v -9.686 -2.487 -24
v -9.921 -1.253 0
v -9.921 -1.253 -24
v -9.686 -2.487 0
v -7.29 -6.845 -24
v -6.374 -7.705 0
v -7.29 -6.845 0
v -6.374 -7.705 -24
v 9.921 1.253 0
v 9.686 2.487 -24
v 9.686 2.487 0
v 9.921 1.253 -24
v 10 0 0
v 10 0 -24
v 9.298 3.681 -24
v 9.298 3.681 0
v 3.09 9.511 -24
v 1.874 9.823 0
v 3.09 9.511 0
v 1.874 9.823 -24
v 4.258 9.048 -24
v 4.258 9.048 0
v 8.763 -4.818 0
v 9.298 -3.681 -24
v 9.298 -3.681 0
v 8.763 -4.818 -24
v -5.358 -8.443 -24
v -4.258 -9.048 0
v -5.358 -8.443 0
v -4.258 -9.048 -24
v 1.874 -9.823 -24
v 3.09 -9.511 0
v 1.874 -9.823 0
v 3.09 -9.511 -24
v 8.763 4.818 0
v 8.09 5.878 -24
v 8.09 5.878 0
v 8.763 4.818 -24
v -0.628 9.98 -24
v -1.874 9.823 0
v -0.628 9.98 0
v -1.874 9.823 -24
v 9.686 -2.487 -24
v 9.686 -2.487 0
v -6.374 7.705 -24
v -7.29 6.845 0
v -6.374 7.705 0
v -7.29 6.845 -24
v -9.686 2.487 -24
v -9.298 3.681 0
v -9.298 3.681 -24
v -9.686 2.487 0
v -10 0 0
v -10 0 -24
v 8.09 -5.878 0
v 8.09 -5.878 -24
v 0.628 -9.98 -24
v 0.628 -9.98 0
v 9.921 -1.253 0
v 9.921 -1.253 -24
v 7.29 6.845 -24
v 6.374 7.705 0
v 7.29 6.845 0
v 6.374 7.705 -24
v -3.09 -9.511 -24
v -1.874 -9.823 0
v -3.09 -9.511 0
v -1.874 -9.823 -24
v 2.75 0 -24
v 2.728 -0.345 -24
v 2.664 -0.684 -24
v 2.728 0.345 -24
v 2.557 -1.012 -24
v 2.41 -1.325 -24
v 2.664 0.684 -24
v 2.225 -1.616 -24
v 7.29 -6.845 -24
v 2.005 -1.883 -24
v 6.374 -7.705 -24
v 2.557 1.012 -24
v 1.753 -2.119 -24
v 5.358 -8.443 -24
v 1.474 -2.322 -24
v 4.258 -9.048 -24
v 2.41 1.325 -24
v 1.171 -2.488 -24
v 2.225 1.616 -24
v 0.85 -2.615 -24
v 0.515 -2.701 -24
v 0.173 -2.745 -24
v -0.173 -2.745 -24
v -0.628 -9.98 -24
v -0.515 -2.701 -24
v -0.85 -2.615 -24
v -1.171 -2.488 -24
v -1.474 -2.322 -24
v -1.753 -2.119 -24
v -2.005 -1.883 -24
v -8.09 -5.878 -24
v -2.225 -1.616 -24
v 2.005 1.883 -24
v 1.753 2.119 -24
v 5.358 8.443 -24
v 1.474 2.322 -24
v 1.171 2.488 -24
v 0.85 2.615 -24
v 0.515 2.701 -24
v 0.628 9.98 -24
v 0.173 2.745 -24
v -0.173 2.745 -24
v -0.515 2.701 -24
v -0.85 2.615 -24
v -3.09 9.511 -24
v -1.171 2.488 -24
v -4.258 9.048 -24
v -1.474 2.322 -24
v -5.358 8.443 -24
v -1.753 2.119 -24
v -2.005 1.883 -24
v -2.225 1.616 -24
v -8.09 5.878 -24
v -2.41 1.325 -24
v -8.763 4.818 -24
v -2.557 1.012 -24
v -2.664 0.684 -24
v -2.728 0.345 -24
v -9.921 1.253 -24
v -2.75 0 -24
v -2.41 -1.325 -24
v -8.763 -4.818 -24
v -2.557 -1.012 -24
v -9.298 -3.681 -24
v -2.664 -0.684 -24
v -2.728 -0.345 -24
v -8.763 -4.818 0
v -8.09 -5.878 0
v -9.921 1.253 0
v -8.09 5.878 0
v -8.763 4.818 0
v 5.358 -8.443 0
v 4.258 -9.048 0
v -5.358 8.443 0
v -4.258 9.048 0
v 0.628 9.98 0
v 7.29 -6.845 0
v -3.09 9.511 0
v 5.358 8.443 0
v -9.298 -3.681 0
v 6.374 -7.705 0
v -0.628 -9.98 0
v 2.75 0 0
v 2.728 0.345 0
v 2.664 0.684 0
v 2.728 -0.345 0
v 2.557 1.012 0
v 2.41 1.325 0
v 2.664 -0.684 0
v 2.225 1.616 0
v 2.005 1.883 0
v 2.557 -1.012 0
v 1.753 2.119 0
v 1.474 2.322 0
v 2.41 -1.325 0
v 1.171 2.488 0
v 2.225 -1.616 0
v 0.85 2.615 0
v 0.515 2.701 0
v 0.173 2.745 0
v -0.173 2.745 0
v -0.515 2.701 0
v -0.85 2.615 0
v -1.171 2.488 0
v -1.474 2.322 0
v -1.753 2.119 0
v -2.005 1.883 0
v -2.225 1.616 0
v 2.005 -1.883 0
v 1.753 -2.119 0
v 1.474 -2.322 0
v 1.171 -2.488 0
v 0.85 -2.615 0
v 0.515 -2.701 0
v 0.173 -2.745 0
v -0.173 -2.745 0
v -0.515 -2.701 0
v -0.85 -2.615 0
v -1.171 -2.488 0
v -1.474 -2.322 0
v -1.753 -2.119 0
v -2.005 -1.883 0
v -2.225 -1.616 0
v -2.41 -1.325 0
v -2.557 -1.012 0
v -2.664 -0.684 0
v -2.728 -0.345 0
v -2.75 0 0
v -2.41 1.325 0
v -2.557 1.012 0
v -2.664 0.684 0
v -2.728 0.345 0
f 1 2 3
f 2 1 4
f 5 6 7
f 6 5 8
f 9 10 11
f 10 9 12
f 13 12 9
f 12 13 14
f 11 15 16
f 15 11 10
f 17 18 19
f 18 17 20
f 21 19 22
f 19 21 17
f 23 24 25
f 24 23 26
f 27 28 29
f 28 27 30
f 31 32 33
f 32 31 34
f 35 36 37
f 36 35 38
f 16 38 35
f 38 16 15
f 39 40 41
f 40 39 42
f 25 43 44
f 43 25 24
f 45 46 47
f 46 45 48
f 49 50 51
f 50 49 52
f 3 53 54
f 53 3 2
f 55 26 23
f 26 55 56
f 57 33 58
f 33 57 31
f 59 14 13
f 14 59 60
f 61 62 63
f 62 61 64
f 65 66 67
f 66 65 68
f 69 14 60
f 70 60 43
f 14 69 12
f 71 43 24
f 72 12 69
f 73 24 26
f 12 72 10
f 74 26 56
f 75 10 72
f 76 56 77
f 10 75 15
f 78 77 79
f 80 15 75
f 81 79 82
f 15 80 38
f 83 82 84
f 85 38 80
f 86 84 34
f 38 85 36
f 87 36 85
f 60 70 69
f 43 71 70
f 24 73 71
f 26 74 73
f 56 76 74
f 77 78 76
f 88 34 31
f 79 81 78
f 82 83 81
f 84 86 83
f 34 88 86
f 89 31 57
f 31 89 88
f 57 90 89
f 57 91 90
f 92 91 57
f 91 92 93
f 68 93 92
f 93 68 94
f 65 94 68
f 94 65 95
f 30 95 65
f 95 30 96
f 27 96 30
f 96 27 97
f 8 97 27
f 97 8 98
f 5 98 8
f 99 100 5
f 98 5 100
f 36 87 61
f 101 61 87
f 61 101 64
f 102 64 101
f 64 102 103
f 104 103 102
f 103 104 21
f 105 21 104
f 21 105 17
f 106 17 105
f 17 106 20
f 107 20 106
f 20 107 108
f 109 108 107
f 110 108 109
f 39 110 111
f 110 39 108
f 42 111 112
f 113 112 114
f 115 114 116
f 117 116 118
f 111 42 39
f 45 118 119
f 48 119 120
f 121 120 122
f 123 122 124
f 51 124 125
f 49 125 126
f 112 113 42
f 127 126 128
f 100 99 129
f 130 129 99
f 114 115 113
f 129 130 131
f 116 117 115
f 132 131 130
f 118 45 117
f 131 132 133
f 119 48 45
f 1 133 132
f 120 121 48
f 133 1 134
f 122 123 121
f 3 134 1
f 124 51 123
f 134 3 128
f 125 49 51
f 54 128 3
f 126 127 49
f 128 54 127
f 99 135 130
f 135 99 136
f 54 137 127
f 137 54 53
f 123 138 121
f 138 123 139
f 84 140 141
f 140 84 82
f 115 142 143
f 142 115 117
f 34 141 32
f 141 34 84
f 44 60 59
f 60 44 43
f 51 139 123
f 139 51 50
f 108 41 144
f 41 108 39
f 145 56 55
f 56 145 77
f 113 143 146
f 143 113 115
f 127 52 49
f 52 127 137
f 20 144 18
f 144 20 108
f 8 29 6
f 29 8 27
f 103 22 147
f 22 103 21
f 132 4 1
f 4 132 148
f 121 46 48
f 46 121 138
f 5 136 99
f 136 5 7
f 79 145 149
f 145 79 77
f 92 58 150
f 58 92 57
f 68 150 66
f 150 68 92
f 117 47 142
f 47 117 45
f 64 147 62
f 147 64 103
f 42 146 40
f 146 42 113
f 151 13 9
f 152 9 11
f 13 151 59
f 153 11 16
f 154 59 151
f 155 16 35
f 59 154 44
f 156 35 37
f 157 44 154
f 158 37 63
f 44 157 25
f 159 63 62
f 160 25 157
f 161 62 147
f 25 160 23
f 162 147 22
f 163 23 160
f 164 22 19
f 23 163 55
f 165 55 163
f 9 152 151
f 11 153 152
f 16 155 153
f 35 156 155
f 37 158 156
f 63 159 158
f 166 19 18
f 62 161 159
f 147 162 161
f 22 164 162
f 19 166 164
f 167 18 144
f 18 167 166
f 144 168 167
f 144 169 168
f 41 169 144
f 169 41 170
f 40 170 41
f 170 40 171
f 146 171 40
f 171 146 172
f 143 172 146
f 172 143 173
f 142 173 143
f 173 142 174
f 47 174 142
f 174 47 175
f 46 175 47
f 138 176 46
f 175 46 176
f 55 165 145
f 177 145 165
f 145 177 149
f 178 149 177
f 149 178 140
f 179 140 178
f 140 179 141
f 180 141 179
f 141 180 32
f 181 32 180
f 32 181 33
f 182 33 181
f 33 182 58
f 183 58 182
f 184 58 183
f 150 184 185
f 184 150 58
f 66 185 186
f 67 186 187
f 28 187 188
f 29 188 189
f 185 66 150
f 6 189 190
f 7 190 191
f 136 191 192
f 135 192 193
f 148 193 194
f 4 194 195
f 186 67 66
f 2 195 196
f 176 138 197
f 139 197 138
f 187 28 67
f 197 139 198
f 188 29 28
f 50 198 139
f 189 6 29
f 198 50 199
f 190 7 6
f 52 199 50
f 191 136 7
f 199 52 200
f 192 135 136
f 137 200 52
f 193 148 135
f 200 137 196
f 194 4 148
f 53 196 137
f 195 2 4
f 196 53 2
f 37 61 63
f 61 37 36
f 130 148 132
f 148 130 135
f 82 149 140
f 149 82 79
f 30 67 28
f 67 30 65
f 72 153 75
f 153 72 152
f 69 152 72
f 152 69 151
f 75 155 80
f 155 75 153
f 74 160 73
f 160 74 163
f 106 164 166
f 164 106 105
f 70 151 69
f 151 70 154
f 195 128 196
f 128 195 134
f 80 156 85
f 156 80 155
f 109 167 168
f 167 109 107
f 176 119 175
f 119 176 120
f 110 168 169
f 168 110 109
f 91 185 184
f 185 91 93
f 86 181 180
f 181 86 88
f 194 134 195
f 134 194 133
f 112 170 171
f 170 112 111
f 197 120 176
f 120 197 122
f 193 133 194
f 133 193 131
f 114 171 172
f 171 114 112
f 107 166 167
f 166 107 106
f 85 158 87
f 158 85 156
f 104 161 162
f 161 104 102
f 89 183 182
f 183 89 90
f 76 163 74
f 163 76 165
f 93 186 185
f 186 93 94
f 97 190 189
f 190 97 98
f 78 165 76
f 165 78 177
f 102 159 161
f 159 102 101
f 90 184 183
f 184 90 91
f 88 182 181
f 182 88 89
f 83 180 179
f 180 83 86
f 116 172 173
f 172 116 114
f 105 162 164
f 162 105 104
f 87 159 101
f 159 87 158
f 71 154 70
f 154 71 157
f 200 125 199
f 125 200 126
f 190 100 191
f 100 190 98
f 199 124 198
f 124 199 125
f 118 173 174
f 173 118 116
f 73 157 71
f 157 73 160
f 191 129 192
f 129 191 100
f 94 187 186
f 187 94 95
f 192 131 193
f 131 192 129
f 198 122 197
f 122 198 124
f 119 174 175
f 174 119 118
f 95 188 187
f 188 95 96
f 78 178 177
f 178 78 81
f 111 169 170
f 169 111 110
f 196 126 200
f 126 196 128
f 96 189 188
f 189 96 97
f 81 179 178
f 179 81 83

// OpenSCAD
$fn = 50;


difference() {
	union() {
		translate(v = [0, 0, -24.0000000000]) {
			cylinder(h = 24, r = 10.0000000000);
		}
	}
	union() {
		#translate(v = [0, 0, -24]) {
			cylinder(h = 24, r = 2.7500000000);
		}
	}
}
